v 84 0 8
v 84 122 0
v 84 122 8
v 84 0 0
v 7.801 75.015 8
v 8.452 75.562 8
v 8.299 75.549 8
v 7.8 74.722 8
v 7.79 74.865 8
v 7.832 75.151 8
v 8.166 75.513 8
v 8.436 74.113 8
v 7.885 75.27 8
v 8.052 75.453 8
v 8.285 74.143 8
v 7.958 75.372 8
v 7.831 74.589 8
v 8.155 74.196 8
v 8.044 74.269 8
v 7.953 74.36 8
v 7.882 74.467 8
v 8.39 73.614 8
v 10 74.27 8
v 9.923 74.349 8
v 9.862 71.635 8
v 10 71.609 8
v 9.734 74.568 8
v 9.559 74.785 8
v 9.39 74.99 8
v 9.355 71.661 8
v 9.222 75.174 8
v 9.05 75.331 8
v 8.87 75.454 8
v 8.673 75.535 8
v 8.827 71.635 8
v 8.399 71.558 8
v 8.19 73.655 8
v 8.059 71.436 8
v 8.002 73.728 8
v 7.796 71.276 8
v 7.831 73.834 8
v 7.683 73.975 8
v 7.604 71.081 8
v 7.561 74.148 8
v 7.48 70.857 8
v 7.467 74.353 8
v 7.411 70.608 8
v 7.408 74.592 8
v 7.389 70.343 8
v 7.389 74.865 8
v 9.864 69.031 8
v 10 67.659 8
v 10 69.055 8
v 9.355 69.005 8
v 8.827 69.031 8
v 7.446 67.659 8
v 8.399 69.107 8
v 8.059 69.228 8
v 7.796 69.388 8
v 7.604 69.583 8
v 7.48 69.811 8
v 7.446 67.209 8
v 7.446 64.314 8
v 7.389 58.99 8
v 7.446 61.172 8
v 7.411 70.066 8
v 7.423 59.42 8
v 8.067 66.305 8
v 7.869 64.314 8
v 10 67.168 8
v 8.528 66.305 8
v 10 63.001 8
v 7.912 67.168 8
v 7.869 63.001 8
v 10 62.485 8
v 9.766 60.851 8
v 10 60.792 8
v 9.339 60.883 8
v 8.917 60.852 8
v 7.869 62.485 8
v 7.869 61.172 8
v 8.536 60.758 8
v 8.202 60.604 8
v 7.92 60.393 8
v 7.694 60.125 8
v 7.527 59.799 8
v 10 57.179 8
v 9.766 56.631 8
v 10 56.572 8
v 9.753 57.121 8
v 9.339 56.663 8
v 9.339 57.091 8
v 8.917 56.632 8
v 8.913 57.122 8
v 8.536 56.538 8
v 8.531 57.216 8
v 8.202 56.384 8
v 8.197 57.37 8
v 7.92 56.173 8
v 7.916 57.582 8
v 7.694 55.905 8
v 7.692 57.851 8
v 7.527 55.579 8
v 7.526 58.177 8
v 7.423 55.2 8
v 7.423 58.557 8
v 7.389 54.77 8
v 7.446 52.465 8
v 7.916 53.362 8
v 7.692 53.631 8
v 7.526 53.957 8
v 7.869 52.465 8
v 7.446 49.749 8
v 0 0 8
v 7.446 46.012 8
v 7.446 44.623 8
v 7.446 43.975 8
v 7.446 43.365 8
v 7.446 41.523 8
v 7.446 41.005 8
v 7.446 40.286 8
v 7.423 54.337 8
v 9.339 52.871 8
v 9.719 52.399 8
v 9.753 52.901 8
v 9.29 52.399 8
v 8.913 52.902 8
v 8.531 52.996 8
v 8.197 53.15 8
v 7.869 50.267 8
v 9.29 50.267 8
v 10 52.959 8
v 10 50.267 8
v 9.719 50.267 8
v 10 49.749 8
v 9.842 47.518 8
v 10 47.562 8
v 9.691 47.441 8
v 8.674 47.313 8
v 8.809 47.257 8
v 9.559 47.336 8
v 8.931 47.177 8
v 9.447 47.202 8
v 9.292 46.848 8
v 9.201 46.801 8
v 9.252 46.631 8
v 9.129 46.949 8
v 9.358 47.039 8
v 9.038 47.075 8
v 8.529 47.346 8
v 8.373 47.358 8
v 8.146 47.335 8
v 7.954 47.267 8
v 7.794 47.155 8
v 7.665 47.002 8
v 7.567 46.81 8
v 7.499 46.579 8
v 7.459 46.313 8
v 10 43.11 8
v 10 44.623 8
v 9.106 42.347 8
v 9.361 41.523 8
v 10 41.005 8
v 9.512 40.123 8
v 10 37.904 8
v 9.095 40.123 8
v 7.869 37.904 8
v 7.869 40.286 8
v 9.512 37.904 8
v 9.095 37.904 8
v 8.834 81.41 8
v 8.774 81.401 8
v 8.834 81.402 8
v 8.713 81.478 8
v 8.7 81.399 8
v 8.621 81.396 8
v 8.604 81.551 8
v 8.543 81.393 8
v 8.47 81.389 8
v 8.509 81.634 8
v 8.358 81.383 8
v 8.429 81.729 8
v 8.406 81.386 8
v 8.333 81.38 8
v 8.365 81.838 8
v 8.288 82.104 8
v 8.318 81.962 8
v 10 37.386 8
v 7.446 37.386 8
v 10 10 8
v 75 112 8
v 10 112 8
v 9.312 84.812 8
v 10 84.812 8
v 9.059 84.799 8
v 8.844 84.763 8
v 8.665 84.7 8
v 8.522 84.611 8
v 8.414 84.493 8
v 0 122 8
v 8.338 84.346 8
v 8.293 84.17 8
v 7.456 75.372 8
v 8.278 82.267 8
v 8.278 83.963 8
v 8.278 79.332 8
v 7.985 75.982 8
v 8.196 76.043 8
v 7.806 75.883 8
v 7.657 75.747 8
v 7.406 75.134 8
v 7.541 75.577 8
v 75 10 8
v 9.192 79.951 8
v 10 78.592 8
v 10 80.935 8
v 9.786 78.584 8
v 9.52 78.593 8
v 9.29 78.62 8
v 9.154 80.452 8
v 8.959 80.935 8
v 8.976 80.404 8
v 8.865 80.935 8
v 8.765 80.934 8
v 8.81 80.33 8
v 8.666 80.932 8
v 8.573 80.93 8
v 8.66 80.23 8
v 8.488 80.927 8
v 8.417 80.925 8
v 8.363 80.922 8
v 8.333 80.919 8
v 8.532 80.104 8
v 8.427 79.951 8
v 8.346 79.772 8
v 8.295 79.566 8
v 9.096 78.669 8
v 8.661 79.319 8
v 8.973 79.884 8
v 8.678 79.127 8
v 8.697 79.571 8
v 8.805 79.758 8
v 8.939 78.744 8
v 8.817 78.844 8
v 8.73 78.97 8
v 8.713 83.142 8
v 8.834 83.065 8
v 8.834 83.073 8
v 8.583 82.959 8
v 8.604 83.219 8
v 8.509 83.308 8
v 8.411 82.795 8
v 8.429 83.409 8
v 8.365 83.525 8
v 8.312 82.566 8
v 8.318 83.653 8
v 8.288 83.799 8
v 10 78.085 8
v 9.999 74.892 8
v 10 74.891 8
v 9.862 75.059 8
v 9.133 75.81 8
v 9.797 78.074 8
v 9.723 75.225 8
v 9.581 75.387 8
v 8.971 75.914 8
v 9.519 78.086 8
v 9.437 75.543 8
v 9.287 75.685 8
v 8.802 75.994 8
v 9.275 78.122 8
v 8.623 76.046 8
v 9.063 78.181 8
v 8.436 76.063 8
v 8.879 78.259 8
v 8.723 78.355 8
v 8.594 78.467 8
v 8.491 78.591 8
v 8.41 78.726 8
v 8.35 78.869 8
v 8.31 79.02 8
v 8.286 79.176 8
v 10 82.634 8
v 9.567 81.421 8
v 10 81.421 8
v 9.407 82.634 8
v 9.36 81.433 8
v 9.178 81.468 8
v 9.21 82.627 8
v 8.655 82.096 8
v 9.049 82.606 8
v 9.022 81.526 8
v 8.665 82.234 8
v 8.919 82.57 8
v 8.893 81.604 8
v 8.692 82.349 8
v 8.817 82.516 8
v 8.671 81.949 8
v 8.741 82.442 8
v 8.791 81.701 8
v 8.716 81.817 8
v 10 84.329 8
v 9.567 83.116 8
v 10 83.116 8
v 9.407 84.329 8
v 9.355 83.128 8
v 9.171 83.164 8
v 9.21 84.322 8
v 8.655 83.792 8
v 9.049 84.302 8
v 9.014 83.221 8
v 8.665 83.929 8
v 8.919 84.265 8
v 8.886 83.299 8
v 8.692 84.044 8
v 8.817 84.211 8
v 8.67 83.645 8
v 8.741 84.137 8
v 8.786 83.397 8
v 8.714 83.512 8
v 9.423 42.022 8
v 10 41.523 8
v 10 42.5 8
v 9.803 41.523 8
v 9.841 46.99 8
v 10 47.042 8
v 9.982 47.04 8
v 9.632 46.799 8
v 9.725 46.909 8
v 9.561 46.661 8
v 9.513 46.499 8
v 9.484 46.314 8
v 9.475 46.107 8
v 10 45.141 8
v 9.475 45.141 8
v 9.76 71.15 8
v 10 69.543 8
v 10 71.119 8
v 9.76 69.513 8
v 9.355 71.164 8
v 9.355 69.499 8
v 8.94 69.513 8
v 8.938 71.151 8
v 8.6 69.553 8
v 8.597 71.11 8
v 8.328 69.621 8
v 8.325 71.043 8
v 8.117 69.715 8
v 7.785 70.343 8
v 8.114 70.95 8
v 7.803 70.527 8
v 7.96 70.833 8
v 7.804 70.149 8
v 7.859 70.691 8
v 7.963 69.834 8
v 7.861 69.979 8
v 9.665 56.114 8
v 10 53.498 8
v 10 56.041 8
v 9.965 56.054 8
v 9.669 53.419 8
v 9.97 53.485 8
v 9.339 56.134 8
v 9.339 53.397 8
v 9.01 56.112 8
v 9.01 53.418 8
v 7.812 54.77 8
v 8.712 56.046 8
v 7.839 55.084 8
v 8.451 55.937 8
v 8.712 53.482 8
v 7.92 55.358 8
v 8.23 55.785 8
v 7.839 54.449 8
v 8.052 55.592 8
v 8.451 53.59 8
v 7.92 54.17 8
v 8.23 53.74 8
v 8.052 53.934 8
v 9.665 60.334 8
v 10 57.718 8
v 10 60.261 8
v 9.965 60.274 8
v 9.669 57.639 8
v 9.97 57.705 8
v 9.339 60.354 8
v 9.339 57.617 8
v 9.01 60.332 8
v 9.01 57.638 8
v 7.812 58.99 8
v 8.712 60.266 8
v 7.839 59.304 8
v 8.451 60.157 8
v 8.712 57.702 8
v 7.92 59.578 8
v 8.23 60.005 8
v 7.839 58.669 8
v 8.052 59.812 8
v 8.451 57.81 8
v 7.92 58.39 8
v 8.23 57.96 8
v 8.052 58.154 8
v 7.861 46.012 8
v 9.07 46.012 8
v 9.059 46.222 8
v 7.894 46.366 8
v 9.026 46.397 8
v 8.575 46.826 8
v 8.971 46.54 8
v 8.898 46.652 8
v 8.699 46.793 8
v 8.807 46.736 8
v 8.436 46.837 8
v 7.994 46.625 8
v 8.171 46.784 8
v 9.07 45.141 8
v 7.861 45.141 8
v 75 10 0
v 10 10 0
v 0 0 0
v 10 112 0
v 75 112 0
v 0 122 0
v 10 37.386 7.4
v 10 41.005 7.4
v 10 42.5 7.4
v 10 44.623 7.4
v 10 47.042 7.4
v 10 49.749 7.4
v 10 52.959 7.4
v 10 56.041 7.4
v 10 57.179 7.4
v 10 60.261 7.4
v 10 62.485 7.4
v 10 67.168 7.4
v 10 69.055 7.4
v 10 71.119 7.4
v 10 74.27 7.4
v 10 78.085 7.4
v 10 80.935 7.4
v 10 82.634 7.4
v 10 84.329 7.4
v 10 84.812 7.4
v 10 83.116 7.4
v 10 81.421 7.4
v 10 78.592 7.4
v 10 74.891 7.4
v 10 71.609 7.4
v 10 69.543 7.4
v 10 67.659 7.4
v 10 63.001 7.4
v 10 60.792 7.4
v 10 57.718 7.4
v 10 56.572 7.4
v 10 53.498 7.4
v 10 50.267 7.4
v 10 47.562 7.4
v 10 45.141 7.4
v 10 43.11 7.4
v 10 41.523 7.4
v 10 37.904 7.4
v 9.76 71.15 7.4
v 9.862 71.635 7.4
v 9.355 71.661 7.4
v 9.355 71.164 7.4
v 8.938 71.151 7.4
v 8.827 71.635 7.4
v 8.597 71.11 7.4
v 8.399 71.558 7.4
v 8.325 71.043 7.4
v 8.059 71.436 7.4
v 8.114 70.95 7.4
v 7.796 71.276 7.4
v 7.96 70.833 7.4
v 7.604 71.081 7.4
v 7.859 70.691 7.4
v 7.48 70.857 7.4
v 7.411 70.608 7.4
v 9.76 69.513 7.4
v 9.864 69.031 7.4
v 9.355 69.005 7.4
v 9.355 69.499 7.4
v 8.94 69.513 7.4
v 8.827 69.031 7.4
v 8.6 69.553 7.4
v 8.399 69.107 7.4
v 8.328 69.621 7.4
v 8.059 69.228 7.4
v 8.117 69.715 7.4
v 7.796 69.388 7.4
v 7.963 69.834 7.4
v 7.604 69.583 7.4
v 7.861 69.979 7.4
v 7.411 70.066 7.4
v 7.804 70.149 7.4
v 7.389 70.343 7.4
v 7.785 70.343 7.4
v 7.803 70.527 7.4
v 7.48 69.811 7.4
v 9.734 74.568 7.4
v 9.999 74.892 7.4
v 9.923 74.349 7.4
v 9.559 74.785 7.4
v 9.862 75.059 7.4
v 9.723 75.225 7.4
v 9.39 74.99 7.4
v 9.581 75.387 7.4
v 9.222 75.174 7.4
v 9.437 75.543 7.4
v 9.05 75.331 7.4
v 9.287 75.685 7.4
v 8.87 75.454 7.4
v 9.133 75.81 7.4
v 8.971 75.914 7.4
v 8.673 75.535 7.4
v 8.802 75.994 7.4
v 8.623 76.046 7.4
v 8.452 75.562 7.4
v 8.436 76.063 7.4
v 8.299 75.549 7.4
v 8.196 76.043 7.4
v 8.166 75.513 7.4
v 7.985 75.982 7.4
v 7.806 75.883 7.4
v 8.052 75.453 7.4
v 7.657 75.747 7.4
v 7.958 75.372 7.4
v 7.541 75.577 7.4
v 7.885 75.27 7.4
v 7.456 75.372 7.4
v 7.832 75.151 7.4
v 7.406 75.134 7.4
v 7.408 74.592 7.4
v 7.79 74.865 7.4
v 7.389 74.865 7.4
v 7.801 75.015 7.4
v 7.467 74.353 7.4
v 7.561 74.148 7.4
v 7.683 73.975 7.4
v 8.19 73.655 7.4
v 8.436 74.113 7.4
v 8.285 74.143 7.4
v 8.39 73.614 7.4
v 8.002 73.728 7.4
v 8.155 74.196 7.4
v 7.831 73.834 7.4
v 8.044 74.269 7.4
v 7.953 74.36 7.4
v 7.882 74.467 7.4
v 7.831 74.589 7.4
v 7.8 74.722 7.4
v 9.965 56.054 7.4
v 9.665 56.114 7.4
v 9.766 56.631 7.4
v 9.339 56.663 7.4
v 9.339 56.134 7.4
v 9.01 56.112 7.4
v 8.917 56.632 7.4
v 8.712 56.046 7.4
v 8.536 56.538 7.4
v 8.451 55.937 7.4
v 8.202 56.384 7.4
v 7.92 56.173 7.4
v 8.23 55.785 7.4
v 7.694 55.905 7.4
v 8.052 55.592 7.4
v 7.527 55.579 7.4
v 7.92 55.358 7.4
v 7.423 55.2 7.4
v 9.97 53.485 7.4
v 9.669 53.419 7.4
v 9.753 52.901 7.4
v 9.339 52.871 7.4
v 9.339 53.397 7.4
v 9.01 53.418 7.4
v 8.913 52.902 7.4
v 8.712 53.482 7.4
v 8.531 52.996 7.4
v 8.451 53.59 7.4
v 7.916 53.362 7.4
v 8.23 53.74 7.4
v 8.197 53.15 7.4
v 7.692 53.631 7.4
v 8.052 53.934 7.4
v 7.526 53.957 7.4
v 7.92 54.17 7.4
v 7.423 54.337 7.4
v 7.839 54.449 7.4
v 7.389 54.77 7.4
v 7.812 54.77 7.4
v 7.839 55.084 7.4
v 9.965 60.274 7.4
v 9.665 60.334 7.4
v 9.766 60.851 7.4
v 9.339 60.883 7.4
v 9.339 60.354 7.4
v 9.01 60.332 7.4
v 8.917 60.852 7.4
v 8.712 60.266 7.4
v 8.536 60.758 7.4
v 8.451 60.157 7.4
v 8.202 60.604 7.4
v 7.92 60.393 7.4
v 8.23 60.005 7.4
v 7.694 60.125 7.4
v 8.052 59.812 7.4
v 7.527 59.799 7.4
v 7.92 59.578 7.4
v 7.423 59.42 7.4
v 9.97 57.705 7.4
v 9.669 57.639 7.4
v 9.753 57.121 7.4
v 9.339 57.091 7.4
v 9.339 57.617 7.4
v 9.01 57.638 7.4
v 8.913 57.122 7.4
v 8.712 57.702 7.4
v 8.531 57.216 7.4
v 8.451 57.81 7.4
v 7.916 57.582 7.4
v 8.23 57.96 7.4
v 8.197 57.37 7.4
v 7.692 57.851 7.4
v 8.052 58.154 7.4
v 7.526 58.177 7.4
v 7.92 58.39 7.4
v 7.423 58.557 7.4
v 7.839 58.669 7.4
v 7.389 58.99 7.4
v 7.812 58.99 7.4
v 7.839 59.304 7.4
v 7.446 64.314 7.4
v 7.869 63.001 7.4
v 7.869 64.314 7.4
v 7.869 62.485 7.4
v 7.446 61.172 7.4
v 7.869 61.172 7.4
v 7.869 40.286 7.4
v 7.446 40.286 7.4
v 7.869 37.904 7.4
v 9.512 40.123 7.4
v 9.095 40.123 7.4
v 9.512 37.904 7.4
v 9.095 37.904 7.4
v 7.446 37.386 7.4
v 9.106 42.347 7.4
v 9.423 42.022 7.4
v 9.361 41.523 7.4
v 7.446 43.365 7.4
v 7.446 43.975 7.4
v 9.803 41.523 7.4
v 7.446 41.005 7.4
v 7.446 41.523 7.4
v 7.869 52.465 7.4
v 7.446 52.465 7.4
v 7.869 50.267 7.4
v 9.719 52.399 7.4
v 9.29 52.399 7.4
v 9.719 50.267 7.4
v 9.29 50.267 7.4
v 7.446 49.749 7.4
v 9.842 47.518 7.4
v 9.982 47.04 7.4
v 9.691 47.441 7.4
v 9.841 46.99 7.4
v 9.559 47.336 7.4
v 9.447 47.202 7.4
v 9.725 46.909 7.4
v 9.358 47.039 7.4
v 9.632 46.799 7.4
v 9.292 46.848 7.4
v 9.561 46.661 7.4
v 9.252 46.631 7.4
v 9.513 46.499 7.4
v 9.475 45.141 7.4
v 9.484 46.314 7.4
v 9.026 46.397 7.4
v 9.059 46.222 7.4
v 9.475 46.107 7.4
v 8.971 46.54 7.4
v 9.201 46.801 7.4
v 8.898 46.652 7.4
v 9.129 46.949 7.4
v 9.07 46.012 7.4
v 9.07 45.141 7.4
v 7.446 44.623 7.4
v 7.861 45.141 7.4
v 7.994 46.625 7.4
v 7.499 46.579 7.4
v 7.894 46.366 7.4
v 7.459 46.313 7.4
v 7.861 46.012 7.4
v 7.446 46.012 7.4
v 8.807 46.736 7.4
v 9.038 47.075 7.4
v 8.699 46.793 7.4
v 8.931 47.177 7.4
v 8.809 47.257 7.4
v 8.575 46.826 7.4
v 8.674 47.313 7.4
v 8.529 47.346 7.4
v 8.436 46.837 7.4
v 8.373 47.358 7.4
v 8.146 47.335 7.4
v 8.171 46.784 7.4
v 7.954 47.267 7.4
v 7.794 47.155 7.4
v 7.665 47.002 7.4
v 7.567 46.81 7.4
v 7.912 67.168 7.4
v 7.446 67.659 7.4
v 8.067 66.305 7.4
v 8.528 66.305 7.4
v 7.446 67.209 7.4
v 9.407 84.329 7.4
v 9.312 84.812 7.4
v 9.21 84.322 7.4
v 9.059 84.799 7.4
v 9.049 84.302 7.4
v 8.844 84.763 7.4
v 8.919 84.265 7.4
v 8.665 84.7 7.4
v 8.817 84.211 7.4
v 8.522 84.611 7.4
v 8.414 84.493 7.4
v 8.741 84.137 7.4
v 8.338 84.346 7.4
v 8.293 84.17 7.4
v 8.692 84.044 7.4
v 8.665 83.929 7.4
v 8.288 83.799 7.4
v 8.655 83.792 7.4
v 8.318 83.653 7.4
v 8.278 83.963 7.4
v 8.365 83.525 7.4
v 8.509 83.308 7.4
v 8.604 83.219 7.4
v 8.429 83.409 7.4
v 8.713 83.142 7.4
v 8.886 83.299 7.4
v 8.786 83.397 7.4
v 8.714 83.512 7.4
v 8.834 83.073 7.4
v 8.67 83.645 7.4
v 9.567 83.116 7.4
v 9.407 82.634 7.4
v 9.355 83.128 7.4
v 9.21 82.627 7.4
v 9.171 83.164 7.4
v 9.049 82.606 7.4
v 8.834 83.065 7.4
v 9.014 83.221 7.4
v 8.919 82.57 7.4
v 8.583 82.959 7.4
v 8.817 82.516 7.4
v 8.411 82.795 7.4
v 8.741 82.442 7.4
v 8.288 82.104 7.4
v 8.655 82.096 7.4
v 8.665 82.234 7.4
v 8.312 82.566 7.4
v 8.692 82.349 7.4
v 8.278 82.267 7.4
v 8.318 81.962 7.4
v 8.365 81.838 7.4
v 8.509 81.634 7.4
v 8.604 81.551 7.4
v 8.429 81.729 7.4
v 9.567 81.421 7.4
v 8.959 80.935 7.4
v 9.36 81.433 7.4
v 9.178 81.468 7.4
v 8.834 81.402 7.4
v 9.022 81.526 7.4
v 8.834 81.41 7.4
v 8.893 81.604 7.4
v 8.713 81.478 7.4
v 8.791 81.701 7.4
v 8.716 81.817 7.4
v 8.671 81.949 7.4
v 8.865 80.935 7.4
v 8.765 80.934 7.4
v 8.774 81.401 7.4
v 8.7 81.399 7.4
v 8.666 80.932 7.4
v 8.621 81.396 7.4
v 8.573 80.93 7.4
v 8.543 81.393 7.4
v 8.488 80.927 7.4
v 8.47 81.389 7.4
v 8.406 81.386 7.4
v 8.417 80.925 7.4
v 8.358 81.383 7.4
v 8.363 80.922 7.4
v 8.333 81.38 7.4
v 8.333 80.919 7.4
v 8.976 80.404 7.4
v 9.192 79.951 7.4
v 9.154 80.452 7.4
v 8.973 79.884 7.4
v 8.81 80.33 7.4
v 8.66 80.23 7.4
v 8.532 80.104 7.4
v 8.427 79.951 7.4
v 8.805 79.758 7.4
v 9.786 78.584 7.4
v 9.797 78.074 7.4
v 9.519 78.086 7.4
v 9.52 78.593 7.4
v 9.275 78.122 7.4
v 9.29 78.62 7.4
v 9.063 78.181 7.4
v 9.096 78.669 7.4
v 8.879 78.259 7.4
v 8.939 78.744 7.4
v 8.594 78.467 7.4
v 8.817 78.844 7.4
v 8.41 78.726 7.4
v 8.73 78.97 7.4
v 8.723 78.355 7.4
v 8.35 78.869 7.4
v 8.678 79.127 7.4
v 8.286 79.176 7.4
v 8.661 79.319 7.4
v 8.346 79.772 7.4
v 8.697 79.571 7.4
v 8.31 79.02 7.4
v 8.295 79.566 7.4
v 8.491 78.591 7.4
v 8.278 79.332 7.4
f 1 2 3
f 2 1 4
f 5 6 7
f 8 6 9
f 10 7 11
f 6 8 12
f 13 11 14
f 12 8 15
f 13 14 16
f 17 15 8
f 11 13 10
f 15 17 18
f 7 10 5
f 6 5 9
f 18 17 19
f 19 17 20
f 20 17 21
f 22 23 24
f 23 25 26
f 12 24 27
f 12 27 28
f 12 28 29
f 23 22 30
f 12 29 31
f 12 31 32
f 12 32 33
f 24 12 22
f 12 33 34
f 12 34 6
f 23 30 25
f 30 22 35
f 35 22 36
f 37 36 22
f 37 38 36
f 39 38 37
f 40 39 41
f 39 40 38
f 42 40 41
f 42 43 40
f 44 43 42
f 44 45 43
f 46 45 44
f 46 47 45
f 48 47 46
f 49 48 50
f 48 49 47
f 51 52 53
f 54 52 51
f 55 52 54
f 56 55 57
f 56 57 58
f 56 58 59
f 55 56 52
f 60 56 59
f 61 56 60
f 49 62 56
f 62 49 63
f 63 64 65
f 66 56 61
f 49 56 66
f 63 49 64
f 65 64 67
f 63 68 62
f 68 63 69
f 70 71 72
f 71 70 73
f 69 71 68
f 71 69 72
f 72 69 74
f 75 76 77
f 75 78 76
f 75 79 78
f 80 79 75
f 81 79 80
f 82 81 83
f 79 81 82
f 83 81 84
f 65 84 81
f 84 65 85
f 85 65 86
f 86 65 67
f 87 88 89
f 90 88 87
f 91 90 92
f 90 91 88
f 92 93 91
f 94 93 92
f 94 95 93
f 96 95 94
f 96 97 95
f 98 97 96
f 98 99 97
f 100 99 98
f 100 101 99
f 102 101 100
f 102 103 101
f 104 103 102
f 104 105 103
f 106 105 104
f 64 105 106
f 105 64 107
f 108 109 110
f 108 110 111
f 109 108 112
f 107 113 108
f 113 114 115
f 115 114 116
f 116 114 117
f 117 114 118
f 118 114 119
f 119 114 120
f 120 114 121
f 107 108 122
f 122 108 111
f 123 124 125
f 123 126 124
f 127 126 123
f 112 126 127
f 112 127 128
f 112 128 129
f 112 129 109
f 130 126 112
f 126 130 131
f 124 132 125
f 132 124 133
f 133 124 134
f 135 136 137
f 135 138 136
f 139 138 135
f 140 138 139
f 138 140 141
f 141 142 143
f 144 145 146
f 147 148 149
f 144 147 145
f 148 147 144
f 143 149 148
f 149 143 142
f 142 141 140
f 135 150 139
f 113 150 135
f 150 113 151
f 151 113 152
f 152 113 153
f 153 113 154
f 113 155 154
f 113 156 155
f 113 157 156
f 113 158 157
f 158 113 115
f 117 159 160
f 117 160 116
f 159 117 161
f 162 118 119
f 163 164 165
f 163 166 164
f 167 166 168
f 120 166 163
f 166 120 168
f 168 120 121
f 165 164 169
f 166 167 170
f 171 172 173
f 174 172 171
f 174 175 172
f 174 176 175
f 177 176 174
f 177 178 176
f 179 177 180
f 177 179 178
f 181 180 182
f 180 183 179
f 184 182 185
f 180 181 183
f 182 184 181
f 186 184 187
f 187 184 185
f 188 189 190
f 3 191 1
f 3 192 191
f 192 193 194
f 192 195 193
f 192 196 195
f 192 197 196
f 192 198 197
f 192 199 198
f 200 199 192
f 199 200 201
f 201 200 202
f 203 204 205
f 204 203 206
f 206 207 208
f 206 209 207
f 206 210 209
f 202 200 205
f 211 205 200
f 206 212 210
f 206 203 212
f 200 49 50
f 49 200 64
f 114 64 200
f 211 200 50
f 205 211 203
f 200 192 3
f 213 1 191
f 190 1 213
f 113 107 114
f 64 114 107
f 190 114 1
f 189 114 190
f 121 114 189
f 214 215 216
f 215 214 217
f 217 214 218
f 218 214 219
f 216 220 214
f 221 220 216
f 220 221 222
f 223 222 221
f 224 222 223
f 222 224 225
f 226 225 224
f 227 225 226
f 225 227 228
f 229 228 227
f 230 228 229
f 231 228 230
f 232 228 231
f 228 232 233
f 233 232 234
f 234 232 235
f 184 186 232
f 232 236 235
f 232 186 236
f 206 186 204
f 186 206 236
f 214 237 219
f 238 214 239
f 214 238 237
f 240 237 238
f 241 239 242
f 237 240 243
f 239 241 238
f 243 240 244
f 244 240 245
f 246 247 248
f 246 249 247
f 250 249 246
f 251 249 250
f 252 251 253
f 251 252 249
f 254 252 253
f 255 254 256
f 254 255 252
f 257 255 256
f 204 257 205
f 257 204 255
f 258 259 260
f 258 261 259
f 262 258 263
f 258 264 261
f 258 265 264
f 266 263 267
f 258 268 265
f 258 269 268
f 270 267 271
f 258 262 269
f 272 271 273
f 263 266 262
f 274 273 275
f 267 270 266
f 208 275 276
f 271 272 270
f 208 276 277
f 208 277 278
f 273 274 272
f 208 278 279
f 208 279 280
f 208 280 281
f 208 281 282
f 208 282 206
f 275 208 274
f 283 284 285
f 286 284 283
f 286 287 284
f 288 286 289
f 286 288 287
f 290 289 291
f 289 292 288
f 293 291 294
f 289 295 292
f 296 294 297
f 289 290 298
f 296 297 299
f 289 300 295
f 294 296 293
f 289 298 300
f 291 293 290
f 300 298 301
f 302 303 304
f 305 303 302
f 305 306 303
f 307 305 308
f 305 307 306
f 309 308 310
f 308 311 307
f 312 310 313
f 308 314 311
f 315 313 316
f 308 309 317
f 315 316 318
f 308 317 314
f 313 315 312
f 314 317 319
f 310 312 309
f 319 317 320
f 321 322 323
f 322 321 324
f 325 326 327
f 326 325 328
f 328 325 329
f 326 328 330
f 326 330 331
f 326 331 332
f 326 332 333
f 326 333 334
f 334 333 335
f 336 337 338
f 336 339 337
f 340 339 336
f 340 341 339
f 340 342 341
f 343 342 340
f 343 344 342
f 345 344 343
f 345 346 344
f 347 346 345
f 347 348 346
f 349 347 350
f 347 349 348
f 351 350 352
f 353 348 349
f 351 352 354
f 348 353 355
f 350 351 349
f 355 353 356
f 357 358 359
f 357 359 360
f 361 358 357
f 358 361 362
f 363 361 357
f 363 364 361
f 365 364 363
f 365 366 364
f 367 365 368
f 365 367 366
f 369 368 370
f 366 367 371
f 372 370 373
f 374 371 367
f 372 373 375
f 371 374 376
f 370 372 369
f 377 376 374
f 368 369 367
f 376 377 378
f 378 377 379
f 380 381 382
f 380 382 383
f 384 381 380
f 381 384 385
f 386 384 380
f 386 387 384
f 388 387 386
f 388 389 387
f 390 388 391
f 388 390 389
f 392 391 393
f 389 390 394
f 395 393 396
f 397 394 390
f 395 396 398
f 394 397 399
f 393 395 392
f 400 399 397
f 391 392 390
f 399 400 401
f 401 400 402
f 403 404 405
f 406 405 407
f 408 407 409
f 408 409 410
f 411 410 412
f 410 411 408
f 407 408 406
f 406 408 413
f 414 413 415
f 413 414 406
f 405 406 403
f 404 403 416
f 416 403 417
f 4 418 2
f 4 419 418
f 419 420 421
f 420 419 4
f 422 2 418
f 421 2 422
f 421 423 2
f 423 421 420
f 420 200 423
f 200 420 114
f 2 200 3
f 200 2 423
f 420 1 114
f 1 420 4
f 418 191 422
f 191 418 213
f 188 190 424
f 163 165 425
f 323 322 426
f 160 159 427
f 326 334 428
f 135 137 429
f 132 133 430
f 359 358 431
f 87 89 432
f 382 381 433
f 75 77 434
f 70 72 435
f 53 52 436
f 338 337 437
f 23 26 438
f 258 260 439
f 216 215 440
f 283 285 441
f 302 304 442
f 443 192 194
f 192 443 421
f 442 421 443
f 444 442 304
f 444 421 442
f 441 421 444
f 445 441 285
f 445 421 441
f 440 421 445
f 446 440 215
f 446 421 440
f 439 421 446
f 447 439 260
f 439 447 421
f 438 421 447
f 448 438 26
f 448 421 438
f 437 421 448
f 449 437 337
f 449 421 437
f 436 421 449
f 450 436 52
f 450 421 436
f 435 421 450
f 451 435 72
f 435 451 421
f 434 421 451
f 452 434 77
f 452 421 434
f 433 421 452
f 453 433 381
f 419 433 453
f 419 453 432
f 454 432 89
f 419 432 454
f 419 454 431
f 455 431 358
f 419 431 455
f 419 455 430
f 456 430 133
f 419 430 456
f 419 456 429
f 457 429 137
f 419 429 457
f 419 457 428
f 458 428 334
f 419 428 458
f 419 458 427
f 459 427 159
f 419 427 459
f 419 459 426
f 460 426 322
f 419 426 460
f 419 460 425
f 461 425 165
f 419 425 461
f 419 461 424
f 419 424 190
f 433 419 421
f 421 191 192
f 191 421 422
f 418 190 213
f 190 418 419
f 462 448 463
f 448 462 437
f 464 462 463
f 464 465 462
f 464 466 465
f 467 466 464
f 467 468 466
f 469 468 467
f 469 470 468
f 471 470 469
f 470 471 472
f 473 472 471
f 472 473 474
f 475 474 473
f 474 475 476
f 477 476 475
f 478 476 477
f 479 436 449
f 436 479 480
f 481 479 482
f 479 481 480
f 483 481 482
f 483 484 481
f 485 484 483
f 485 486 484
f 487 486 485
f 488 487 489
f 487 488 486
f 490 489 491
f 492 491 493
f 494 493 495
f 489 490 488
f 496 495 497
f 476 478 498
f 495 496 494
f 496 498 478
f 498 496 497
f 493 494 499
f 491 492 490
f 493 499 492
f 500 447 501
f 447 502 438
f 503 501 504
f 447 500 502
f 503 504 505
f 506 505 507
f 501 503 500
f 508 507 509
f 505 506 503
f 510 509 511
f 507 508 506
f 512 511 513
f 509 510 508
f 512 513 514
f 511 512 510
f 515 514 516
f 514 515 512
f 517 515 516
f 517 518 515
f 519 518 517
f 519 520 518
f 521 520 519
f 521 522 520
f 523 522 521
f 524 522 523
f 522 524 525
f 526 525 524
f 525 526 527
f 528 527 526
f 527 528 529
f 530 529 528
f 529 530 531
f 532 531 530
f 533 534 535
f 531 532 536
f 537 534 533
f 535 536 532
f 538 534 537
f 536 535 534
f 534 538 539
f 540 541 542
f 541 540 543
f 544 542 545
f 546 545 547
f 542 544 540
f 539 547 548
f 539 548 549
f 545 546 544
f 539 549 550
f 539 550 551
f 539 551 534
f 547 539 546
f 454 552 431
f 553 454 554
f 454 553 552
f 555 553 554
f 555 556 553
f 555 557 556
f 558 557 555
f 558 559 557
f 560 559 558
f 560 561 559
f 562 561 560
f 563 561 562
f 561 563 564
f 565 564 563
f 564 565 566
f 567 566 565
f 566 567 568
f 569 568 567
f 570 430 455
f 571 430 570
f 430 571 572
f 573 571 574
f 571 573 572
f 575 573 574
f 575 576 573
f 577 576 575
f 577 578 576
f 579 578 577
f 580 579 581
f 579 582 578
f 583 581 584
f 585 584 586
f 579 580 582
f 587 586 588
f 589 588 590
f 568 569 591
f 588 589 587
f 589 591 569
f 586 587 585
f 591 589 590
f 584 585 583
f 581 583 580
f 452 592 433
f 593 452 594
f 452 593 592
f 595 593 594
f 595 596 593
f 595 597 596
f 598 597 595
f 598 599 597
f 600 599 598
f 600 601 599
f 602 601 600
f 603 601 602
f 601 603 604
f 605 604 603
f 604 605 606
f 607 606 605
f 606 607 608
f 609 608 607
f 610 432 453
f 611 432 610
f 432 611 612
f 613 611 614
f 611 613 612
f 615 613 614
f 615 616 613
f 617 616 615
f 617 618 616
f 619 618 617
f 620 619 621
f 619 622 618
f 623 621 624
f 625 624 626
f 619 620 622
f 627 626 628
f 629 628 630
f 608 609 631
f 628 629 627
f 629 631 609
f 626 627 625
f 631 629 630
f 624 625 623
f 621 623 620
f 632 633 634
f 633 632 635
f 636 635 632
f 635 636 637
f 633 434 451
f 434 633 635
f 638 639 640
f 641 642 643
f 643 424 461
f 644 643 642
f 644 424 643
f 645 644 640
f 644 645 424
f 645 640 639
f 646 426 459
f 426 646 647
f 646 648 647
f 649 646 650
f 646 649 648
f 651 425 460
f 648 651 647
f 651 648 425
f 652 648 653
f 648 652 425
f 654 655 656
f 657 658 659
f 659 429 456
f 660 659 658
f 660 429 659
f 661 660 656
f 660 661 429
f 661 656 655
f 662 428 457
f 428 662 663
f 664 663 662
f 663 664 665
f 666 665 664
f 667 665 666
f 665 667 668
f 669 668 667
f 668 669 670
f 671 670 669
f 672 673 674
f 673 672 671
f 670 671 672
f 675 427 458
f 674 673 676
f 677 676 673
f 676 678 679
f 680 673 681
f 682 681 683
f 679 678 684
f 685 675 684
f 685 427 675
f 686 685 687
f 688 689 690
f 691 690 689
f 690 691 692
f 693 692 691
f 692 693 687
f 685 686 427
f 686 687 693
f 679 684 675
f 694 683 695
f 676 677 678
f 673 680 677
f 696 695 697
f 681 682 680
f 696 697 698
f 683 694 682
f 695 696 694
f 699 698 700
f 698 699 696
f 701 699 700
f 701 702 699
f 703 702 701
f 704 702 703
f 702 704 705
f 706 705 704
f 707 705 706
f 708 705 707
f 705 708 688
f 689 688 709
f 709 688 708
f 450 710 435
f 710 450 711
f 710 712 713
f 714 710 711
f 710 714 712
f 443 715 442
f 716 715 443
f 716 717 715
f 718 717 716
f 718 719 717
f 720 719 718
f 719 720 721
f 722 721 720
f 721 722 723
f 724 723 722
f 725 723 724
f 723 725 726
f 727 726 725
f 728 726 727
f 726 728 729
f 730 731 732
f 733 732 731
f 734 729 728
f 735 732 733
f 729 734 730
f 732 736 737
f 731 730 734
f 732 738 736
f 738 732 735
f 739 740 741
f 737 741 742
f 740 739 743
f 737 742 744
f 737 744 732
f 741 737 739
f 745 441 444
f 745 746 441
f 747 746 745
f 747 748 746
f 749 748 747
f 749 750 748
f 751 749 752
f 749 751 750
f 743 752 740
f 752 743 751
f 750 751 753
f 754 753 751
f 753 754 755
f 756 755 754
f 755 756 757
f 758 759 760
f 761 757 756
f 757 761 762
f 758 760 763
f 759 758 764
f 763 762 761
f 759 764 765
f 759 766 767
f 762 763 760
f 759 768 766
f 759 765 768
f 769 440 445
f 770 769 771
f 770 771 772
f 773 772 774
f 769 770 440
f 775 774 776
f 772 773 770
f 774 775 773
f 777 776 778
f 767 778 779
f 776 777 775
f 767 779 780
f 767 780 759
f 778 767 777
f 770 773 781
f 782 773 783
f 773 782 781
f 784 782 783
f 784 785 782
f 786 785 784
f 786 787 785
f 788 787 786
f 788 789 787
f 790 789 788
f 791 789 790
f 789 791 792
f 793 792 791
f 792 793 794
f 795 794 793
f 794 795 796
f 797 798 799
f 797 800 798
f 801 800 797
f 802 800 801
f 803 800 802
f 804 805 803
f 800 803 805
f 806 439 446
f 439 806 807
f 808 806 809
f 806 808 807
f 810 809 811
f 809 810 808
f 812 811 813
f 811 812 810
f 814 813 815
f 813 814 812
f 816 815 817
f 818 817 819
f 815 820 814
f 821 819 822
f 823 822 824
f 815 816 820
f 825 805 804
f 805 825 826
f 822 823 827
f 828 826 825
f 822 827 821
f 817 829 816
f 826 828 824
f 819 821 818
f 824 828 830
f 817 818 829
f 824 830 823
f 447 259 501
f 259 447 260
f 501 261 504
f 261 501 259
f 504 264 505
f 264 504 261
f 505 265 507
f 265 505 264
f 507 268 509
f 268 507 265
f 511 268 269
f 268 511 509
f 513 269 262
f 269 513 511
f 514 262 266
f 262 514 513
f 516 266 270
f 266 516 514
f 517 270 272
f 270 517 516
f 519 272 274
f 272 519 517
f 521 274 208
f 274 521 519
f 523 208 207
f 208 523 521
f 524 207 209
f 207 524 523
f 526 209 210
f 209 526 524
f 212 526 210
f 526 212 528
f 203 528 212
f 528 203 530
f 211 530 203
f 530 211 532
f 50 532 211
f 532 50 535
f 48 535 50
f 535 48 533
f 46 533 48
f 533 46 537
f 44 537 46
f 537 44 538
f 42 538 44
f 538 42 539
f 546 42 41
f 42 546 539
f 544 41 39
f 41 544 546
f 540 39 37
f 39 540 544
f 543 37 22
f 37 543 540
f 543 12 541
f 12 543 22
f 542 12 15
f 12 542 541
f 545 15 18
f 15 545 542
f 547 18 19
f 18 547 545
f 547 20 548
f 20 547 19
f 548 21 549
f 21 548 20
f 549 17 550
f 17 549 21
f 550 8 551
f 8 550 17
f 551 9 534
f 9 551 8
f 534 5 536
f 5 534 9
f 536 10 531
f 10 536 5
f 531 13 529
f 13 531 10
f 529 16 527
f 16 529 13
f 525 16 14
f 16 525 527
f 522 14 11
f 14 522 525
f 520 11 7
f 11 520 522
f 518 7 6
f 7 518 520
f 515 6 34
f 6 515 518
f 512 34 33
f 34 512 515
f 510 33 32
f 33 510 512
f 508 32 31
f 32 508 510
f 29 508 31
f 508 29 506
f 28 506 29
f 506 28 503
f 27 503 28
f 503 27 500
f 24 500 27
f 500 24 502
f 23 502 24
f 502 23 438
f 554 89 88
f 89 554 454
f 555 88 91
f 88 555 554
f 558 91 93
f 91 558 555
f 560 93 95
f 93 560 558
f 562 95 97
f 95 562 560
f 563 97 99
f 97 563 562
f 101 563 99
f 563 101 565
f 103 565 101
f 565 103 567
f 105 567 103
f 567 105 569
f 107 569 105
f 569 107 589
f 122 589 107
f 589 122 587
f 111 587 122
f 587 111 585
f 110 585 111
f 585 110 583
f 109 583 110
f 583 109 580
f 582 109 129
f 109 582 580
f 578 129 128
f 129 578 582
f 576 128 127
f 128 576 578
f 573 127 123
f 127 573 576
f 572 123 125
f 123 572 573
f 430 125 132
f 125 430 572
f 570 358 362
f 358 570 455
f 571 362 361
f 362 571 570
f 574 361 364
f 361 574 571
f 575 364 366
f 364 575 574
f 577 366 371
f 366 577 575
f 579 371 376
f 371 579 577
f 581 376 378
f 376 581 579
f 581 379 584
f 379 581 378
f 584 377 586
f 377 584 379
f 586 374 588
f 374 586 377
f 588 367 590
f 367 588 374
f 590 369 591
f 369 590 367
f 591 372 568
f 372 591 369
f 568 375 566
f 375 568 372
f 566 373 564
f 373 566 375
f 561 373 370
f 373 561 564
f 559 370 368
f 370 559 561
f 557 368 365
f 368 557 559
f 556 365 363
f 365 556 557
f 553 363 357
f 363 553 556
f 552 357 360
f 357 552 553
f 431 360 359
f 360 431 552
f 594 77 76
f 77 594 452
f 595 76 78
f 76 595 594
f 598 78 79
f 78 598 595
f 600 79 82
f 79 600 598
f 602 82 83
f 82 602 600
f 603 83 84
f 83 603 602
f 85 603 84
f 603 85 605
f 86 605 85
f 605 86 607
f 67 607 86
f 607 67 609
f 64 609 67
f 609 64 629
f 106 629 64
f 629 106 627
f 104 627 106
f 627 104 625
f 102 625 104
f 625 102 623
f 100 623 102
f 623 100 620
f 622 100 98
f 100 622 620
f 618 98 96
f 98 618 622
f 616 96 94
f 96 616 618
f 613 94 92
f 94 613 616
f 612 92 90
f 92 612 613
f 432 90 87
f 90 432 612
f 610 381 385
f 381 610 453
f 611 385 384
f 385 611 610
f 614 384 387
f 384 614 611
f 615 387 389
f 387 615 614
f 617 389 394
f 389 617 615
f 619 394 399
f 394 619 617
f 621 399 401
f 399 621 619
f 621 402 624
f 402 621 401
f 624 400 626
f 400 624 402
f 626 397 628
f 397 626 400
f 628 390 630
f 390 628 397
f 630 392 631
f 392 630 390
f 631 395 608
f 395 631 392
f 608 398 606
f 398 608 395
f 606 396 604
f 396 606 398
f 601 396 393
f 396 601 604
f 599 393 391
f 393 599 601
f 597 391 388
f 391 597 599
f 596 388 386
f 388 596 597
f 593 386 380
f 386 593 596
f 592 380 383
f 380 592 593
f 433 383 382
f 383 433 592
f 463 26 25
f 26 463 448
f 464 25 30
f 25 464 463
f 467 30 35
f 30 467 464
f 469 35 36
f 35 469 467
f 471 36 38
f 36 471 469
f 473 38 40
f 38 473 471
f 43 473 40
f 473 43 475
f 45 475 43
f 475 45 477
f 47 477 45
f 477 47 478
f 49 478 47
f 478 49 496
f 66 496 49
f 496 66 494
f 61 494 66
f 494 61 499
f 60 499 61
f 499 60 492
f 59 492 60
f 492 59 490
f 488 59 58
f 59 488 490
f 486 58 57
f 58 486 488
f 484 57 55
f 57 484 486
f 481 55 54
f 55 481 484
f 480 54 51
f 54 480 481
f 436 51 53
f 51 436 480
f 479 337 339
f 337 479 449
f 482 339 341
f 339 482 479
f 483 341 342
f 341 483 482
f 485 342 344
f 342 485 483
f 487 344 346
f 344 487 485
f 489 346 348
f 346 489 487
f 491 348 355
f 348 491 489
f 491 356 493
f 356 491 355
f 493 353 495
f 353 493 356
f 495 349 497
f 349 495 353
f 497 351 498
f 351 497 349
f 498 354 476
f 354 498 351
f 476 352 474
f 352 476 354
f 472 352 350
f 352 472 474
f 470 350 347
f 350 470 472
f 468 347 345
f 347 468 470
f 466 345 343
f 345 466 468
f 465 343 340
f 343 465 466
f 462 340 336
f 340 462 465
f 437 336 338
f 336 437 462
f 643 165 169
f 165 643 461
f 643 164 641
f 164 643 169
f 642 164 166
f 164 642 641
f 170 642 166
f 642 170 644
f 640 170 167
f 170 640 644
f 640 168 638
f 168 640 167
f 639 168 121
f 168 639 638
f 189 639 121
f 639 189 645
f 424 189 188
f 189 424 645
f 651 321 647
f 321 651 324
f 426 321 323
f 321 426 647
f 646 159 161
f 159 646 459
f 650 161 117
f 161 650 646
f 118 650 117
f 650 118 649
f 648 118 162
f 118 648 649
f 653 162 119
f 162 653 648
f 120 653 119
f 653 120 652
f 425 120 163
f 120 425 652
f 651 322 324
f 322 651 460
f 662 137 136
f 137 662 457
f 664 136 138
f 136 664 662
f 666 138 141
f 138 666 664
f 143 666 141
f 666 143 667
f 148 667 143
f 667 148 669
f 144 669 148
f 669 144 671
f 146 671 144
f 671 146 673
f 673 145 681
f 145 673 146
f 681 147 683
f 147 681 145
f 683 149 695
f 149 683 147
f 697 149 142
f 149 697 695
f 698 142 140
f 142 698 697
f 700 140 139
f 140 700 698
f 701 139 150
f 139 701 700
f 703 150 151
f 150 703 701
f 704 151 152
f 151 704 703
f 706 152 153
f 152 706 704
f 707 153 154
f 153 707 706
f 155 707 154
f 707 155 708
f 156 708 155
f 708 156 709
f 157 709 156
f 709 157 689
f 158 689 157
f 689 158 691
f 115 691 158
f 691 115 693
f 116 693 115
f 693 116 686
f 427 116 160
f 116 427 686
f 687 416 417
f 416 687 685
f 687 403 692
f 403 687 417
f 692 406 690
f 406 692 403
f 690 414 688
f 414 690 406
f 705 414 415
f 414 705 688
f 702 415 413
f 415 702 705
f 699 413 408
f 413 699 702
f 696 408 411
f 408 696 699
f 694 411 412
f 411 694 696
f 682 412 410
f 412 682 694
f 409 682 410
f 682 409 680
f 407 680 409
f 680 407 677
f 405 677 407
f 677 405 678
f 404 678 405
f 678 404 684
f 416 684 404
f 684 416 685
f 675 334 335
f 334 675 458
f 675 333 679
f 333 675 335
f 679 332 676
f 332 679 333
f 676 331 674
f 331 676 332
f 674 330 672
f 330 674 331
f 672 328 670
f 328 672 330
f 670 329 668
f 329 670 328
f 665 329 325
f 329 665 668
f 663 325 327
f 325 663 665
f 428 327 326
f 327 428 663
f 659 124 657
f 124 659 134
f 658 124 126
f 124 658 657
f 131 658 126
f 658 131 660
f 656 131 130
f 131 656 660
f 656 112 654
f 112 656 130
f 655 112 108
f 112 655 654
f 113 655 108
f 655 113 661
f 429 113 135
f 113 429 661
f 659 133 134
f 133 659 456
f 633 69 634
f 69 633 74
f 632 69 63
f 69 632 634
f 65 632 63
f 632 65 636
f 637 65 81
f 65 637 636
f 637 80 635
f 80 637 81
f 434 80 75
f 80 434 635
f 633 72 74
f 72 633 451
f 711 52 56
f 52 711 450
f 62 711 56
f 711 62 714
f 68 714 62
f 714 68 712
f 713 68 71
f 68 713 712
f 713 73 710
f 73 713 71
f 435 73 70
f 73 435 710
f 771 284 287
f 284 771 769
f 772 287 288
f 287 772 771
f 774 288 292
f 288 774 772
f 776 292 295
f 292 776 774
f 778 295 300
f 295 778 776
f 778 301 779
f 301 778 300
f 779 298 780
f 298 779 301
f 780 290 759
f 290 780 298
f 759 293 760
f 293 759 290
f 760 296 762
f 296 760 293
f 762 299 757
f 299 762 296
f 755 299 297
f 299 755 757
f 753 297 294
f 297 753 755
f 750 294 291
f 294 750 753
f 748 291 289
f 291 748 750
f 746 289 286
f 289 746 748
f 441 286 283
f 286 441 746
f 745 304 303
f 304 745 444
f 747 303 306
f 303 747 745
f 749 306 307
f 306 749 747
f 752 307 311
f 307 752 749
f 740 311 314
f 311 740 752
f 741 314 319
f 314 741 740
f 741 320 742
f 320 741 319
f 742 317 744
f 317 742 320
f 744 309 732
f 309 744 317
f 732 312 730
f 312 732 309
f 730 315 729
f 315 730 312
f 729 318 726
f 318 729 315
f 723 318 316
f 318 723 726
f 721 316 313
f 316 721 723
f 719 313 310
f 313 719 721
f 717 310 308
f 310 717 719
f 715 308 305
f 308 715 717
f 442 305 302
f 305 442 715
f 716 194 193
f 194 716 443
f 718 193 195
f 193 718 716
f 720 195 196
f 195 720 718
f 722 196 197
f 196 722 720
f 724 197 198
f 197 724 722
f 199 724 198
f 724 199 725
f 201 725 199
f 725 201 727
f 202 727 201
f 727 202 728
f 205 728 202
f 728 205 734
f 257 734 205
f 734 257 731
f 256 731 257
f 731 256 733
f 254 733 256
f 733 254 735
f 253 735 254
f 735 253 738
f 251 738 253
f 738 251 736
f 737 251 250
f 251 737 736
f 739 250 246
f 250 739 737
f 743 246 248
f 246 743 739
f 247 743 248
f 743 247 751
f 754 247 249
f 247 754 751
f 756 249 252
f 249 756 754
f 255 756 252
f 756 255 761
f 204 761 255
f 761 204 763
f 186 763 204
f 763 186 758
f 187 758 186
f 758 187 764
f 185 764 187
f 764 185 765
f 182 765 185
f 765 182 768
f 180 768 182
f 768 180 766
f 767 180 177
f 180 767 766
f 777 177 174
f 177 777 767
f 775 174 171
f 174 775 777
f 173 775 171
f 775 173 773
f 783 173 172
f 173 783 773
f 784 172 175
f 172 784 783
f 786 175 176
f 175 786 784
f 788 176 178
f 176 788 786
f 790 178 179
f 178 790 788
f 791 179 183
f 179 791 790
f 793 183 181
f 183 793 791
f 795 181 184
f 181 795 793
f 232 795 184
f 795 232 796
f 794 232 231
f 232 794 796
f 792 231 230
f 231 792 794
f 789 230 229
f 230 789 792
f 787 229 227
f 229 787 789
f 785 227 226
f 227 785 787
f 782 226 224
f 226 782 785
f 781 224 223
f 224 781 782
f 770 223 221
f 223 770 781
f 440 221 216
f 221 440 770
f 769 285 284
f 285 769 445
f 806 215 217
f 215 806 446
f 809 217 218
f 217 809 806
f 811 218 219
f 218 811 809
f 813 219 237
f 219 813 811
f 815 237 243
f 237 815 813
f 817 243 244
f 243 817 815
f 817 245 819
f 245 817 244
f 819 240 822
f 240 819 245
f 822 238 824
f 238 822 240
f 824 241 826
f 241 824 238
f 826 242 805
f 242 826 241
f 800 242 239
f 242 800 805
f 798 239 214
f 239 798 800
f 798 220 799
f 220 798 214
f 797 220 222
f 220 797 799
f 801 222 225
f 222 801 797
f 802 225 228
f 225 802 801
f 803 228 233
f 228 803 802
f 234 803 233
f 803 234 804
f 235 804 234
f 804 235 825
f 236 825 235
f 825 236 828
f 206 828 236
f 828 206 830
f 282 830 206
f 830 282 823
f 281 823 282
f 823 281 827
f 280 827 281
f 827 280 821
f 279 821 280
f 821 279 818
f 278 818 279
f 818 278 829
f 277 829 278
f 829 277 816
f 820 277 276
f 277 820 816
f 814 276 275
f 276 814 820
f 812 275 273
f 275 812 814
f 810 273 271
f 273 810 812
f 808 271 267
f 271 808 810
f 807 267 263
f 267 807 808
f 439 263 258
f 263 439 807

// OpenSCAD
// Foot height gauge. Every one of the eight 4 in feet has to be wound out to exactly 10.2 cm
// from the plate face that touches the top to the bottom of the pad, so the underside of the
// desk ends at 80.2 and the tops sit flat. Instead of measuring eight times: stand the foot on
// its pad, slide this C over it from the side, and wind the pad until the gauge just slides on
// with no rock. The inside height is 102.0 mm. Print flat, any filament, 100% infill.

inside_h = 102.0; inside_w = 64;   // the 59.5 mm plate passes through
arm = 10; th = 8;
difference() {
    cube([inside_w + 2 * arm, inside_h + 2 * arm, th]);
    translate([arm, arm, -1]) cube([inside_w + 1, inside_h, th + 2]);   // open on the +x side
    translate([arm - 0.6, arm + inside_h / 2, th - 0.6]) rotate([0, 0, 90]) linear_extrude(1) text("EKB FOOT 10.2 cm", size = 4, halign = "center", valign = "center");
}
